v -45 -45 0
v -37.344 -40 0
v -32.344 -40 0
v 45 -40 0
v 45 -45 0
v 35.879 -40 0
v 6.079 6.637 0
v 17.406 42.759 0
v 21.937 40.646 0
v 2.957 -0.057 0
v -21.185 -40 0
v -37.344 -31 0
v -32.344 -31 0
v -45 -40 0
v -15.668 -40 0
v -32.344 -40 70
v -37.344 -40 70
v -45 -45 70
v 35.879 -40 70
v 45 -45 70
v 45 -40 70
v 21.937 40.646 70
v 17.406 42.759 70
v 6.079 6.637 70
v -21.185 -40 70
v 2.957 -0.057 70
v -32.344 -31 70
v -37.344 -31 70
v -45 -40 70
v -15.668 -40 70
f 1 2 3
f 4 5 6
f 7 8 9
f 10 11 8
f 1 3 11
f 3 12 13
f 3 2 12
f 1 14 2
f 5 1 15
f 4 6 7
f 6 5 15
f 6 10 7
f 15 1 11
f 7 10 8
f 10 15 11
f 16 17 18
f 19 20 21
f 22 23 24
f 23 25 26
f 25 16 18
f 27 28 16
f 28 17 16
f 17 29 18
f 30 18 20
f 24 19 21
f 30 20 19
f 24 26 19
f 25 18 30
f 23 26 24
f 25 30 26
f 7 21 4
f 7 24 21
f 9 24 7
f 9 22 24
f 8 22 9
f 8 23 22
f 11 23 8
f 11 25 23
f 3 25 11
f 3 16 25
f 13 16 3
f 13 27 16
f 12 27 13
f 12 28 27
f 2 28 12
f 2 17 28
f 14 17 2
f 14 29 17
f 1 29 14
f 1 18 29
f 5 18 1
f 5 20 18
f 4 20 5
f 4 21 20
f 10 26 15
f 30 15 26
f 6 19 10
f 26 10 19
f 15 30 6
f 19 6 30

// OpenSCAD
// ARTIFEX template: phone / tablet stand (printed lying on its side)
width = 70;
base_depth = 90;
angle = 65;
thickness = 5;
lip_h = 14;
device_gap = 13;
$fn = 48;

rest_x = base_depth * 0.3;
rest_len = base_depth * 1.05;
lip_x = max(rest_x - device_gap / sin(angle) - thickness, 0);

module profile() {
    square([base_depth, thickness]);
    translate([lip_x, 0]) square([thickness, lip_h]);
    translate([rest_x, 0]) rotate(angle) square([rest_len, thickness]);
    hull() {
        translate([base_depth - thickness, 0]) square([thickness, thickness]);
        translate([rest_x, 0]) rotate(angle) translate([rest_len * 0.55, 0]) square([thickness, thickness]);
    }
}

translate([-base_depth / 2, -base_depth / 2, 0]) linear_extrude(width) profile();
